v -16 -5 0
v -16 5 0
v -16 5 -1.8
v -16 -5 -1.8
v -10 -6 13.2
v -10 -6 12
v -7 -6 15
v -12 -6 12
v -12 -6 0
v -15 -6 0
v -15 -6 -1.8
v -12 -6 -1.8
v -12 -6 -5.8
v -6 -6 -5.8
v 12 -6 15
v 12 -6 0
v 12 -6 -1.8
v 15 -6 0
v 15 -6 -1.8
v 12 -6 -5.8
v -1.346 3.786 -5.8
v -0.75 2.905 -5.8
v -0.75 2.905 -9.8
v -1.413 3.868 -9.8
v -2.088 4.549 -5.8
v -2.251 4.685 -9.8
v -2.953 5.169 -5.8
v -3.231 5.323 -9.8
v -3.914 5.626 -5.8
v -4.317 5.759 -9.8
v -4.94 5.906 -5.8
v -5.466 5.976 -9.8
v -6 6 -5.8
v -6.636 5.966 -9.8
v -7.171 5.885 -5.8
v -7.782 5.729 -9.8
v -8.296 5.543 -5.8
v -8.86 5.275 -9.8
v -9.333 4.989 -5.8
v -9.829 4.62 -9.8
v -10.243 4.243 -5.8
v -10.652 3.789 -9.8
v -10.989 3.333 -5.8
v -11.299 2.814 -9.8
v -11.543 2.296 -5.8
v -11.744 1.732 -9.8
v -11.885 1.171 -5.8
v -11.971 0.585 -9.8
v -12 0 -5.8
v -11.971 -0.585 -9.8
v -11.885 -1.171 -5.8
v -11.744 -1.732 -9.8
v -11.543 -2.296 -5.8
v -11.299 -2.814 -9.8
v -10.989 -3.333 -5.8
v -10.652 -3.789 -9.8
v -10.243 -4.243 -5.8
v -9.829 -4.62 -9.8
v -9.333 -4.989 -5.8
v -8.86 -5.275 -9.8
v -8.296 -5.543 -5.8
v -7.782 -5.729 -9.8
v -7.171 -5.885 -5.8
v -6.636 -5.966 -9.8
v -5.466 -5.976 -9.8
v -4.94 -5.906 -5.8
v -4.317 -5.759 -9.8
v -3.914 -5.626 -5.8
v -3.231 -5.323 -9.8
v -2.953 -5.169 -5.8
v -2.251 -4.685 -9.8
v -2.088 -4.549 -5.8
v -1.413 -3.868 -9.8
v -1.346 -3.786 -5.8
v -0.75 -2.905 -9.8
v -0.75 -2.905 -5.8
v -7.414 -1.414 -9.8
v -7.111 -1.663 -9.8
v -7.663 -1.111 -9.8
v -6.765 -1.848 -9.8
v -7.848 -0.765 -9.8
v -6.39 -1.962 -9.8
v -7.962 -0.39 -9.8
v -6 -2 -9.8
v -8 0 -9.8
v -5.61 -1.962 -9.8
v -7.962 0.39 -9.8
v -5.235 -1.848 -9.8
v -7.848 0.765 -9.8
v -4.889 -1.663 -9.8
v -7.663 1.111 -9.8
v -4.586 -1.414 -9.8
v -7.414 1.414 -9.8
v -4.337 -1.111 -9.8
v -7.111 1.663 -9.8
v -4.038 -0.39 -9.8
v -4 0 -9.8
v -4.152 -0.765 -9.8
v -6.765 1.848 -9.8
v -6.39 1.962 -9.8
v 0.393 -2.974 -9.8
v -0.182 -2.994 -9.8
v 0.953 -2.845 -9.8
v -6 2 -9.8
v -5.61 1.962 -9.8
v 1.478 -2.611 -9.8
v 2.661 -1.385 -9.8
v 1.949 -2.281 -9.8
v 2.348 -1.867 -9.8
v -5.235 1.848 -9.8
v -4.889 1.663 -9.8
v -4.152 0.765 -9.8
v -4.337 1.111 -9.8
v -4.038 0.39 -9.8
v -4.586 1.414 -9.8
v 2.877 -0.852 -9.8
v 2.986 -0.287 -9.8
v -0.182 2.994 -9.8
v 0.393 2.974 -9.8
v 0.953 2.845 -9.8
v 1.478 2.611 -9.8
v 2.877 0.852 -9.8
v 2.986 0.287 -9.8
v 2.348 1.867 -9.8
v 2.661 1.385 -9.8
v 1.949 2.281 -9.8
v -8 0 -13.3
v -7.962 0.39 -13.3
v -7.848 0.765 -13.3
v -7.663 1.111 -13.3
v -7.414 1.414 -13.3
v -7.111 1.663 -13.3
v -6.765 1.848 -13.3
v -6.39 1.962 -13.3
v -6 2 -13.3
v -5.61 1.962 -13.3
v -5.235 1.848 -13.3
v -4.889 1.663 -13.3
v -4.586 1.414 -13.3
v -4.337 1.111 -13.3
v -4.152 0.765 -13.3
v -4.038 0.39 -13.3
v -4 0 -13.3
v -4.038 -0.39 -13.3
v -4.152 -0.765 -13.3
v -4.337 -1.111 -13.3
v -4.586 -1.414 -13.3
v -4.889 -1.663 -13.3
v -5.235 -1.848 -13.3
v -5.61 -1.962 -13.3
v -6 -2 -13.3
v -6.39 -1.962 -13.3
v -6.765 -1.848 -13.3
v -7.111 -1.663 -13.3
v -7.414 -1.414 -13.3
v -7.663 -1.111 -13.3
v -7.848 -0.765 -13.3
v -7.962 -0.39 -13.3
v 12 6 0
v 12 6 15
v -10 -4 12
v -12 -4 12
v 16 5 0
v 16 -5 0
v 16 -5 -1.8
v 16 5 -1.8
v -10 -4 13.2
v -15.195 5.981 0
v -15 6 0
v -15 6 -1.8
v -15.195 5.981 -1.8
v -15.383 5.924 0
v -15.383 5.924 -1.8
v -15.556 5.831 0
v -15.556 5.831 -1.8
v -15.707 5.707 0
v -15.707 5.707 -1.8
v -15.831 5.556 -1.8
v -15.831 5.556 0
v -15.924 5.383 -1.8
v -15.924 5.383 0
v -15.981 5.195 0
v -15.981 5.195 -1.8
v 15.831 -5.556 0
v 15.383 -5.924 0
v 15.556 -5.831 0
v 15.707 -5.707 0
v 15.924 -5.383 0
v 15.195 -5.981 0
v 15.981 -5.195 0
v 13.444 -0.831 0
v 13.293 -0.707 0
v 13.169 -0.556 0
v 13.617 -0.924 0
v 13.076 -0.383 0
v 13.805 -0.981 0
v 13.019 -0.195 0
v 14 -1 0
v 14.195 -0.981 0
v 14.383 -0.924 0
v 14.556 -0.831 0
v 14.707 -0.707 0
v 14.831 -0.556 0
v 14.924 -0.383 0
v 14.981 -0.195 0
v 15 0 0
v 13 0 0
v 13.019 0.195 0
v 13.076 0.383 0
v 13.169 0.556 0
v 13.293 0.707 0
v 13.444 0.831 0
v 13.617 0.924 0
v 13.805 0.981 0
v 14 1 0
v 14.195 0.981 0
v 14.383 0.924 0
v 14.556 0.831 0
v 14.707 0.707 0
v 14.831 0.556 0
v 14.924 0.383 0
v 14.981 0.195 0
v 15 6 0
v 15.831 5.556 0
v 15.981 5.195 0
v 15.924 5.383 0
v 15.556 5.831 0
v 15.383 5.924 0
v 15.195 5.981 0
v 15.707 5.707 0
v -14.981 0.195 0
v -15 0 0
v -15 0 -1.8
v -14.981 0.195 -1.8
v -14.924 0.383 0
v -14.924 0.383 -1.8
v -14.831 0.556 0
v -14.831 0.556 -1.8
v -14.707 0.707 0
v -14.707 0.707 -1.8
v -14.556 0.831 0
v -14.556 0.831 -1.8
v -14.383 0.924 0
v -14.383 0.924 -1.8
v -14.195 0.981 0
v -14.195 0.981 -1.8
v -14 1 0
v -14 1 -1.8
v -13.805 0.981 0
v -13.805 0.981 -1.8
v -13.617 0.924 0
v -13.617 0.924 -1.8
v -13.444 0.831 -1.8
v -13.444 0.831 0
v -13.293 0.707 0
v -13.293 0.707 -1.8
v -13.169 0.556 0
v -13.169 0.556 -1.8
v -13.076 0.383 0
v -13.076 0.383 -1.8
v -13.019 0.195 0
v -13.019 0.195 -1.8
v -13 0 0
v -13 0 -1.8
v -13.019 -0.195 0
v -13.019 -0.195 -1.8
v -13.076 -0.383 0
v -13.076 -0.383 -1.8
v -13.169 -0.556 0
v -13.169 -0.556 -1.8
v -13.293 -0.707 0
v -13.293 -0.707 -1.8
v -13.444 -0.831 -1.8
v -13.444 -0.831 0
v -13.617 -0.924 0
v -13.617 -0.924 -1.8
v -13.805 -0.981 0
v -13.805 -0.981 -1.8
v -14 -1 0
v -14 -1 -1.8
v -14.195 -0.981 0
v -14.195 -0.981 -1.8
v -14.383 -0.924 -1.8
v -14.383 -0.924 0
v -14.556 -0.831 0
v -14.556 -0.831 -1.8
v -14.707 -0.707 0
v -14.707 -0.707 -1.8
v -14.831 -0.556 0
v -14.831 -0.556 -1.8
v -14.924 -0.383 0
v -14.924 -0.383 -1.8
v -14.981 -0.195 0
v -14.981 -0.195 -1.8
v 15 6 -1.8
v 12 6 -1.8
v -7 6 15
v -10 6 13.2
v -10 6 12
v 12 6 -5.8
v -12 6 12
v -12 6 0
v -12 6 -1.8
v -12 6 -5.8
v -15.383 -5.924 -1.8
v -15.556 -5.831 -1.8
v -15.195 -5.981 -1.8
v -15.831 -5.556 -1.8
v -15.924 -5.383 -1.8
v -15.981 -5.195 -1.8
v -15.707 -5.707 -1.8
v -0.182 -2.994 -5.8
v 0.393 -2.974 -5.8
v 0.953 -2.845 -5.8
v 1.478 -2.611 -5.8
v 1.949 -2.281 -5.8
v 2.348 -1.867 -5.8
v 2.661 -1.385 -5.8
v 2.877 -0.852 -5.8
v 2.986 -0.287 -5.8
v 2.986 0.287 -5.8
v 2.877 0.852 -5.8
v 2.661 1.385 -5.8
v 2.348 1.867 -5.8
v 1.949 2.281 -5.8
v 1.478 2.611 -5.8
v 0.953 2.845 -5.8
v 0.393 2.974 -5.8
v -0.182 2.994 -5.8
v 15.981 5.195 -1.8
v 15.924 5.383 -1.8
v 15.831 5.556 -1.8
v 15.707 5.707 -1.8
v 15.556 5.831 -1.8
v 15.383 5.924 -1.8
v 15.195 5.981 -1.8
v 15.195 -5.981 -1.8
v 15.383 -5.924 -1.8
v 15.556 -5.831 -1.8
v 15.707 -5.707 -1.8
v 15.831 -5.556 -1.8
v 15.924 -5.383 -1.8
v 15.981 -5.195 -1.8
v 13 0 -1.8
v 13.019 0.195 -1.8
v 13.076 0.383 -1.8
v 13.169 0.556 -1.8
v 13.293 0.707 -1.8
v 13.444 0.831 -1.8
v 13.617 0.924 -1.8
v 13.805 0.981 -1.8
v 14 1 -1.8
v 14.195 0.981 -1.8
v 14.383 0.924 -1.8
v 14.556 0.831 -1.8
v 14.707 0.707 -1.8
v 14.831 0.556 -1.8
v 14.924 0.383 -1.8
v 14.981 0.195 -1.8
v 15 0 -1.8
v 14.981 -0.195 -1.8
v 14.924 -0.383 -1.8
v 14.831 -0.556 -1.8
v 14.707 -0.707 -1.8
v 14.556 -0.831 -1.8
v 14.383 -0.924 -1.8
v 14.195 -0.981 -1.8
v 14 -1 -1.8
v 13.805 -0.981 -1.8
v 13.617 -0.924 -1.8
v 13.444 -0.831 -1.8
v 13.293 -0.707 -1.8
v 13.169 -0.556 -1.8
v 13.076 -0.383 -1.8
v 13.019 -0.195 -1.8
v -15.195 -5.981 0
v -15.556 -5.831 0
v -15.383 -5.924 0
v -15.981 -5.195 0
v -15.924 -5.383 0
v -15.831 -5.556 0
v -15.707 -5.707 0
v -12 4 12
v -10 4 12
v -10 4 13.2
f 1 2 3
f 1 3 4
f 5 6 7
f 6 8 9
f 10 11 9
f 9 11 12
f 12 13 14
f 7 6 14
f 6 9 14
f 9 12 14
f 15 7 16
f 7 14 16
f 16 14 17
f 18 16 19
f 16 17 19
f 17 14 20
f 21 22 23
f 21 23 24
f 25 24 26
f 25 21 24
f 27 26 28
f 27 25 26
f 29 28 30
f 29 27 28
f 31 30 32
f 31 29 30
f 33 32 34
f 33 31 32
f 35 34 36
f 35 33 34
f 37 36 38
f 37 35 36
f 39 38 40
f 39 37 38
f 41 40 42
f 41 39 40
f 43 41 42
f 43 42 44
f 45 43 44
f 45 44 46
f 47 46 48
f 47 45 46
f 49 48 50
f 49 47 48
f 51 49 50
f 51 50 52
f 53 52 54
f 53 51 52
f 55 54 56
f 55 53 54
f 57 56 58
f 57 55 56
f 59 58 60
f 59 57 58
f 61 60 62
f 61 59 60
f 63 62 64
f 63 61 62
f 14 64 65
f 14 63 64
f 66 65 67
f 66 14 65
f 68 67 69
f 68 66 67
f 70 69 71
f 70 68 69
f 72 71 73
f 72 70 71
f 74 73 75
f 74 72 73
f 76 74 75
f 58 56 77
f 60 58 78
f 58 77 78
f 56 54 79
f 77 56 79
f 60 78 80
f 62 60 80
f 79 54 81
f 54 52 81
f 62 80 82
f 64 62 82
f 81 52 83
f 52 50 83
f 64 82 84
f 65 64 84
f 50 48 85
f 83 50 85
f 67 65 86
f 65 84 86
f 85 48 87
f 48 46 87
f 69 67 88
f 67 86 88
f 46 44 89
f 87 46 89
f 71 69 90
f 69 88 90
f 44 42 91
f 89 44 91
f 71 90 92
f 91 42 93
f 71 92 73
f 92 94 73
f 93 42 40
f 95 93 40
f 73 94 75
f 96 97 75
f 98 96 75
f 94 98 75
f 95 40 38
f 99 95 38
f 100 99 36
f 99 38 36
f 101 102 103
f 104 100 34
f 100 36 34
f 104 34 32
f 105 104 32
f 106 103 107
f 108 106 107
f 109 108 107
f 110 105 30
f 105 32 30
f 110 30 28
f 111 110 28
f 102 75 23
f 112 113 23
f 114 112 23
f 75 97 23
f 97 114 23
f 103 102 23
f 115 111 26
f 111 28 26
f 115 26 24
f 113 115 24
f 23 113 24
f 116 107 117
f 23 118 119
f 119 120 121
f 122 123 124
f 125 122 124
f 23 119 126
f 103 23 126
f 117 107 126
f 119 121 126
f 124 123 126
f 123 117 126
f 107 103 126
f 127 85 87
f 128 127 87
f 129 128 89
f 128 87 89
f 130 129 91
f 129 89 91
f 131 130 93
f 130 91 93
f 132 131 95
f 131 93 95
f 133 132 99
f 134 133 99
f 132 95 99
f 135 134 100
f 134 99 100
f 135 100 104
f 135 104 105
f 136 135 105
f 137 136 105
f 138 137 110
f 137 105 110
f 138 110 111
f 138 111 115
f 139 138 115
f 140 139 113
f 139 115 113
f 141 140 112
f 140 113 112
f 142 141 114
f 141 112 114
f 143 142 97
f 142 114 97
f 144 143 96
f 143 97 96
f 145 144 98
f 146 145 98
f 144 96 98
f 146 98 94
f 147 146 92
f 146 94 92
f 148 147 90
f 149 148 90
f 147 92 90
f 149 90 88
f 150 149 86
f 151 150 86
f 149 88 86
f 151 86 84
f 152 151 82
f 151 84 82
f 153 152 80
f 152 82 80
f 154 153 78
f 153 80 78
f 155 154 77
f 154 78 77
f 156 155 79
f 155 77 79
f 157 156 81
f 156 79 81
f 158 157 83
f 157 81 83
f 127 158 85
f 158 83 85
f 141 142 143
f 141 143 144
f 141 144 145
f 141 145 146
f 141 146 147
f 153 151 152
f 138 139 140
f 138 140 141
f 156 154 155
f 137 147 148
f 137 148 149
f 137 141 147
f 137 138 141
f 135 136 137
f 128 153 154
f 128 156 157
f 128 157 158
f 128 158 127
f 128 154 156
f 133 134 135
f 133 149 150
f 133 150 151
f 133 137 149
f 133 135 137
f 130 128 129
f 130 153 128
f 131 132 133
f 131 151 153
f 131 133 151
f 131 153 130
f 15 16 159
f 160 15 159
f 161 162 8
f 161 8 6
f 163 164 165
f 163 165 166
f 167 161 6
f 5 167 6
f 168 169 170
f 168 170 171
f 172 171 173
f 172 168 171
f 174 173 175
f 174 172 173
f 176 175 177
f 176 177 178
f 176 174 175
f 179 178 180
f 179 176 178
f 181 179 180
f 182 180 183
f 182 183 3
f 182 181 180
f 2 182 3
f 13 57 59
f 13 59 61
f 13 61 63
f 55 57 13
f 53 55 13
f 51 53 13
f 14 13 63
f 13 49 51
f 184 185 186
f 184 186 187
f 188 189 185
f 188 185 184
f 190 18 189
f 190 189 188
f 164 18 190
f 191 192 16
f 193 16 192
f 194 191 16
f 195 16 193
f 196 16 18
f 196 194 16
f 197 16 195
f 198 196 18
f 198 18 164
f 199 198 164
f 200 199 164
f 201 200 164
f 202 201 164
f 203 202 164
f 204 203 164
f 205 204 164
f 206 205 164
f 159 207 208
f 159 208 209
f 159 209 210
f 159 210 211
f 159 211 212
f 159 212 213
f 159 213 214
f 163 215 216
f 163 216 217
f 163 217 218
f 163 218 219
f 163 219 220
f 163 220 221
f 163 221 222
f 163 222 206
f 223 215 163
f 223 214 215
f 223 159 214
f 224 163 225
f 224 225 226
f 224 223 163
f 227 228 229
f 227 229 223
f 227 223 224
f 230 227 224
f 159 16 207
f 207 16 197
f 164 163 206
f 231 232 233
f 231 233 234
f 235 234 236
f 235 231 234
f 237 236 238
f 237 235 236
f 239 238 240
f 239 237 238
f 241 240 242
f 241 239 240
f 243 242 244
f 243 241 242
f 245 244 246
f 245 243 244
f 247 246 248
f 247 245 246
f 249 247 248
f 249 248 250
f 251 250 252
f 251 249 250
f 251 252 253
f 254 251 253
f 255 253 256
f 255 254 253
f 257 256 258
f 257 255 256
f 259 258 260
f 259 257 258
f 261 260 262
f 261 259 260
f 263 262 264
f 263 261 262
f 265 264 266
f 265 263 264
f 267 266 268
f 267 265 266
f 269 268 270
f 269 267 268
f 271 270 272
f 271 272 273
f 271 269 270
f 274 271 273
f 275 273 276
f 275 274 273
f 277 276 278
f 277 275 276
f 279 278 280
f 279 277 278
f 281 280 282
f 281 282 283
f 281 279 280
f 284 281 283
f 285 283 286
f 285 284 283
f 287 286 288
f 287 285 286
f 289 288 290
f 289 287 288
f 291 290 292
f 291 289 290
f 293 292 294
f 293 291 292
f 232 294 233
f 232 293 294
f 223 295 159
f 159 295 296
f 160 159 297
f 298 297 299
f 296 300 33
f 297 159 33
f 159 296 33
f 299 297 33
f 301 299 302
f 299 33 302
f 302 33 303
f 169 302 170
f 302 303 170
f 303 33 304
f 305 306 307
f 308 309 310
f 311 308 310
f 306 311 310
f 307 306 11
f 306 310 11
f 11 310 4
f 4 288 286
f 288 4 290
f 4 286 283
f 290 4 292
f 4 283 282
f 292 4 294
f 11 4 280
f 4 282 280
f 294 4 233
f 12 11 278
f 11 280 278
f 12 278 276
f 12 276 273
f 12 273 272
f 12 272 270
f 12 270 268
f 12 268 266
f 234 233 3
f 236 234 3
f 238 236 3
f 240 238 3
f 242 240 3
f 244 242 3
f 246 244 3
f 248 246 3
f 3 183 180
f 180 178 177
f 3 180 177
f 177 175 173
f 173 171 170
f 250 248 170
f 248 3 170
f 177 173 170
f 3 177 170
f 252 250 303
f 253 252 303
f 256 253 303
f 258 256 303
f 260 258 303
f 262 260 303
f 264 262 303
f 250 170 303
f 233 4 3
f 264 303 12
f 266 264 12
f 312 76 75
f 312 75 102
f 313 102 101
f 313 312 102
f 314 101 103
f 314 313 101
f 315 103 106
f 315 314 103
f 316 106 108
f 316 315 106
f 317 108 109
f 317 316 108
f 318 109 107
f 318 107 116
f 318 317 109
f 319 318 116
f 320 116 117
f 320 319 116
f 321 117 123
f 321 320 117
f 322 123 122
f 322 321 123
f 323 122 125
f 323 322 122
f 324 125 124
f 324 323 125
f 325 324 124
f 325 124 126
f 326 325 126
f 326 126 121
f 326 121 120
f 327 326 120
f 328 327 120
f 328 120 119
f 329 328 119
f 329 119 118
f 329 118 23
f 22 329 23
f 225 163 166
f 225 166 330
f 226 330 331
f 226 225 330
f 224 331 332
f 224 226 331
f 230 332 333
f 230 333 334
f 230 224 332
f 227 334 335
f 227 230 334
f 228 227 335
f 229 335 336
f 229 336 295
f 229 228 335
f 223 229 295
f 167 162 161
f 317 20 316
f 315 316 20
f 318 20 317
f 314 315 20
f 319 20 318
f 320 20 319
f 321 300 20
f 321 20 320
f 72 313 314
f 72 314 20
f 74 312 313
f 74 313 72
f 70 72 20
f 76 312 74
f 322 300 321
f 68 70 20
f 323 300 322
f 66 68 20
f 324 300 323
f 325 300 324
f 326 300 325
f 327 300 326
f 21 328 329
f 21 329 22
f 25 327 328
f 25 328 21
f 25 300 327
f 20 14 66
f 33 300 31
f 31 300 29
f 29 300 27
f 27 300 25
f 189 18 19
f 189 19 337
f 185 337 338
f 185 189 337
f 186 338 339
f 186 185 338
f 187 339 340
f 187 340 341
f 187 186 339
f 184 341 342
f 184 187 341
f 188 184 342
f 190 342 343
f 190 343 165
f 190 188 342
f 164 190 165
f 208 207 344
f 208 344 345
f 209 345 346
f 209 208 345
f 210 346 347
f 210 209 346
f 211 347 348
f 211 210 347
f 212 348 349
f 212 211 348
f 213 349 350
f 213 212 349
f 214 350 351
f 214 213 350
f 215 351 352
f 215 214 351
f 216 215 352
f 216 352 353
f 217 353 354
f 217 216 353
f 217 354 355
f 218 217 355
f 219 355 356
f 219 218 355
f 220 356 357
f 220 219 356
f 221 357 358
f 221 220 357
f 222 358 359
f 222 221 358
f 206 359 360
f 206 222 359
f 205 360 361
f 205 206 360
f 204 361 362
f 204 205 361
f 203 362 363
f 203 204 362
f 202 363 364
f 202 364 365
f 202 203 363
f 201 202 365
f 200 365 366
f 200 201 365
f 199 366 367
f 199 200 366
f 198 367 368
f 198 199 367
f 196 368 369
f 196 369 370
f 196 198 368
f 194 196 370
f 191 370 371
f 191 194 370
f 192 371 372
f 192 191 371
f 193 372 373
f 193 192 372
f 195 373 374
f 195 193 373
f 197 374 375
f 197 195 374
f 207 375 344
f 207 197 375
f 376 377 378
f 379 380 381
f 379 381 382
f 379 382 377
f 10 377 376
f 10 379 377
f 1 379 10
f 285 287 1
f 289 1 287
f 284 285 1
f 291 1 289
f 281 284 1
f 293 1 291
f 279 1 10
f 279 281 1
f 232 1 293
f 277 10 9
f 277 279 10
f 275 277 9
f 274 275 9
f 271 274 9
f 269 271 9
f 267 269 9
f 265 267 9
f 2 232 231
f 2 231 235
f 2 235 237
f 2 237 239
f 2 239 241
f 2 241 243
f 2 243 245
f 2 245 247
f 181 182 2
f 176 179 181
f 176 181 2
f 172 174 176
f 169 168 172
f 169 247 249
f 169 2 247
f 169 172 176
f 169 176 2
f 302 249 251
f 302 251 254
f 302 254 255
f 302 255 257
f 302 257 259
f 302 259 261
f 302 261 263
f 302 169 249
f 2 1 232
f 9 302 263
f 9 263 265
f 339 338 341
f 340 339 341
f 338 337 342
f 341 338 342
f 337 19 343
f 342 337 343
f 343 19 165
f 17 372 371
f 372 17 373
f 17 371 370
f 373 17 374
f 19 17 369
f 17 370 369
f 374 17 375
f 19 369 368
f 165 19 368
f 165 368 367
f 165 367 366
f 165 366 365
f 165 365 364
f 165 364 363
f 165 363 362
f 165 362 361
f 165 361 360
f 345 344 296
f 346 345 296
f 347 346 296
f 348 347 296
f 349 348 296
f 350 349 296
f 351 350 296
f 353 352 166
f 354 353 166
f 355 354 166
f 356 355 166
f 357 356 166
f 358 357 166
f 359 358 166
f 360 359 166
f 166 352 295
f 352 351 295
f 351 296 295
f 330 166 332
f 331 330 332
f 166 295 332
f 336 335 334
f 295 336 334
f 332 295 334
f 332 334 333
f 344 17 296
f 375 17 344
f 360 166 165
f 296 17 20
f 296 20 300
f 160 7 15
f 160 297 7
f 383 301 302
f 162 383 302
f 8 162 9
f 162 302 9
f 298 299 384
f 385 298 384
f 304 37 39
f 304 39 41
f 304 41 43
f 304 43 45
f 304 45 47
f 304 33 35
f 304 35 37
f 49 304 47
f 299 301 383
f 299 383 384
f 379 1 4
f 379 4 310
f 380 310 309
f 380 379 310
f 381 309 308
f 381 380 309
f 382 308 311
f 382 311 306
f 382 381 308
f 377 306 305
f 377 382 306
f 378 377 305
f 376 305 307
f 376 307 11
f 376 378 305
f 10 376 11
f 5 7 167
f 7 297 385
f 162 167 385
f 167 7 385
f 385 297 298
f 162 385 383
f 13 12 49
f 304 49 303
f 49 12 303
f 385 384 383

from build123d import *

# Parameters (mm, degrees)
SKETCH_1_W          = 24
SKETCH_1_H          = 12
EXTRUDE_1_DEPTH     = 12
SKETCH_2_R          = 1
EXTRUDE_2_DEPTH     = 1.8
SKETCH_3_W          = 24
SKETCH_3_H          = 12
EXTRUDE_3_DEPTH     = 4
EXTRUDE_4_DEPTH     = 4
SKETCH_5_R          = 2
EXTRUDE_5_DEPTH     = 3.5
EXTRUDE_6_DEPTH     = 3
CUT_EXTRUDE_1_DEPTH = 12


with BuildPart() as part:
    # Эскиз1 → Бобышка-Вытянуть1 (new body)
    with BuildSketch(Plane.XY):
        Rectangle(SKETCH_1_W, SKETCH_1_H)
    extrude(amount=EXTRUDE_1_DEPTH)

    # Эскиз2 → Бобышка-Вытянуть2 (add)
    with BuildSketch(Plane(origin=(0, 0, 0), x_dir=(-1, 0, 0), z_dir=(0, 0, -1))):
        with BuildLine():
            Line((12, 6), (15, 6))
            ThreePointArc((15, 6), (15.707106781, 5.707106781), (16, 5))
            Line((16, 5), (16, -5))
            ThreePointArc((16, -5), (15.707106781, -5.707106781), (15, -6))
            Line((15, -6), (12, -6))
            Line((12, -6), (-12, -6))
            Line((-12, -6), (-15, -6))
            ThreePointArc((-15, -6), (-15.707106781, -5.707106781), (-16, -5))
            Line((-16, -5), (-16, 5))
            ThreePointArc((-16, 5), (-15.707106781, 5.707106781), (-15, 6))
            Line((-15, 6), (-12, 6))
            Line((-12, 6), (12, 6))
        make_face()
        with Locations((14, 0)):
            Circle(SKETCH_2_R, mode=Mode.SUBTRACT)
        with Locations((-14, 0)):
            Circle(SKETCH_2_R, mode=Mode.SUBTRACT)
    extrude(amount=EXTRUDE_2_DEPTH)

    # Эскиз3 → Бобышка-Вытянуть3 (add)
    with BuildSketch(Plane(origin=(0, 0, -1.8), x_dir=(-1, 0, 0), z_dir=(0, 0, -1))):
        Rectangle(SKETCH_3_W, SKETCH_3_H)
    extrude(amount=EXTRUDE_3_DEPTH)

    # Эскиз4 → Бобышка-Вытянуть4 (add)
    with BuildSketch(Plane(origin=(0, 0, -5.8), x_dir=(-1, 0, 0), z_dir=(0, 0, -1))):
        with BuildLine():
            ThreePointArc((0.75, 2.90473751), (12, 0), (0.75, -2.90473751))
            ThreePointArc((0.75, -2.90473751), (-3, 0), (0.75, 2.90473751))
        make_face()
    extrude(amount=EXTRUDE_4_DEPTH)

    # Эскиз5 → Бобышка-Вытянуть5 (add)
    with BuildSketch(Plane(origin=(0, 0, -9.8), x_dir=(-1, 0, 0), z_dir=(0, 0, -1))):
        with Locations((6, 0)):
            Circle(SKETCH_5_R)
    extrude(amount=EXTRUDE_5_DEPTH)

    # Эскиз6 → Бобышка-Вытянуть6 (add)
    with BuildSketch(Plane.XY.offset(12)):
        Polygon((12, -6), (12, 6), (-10, 6), (-10, 4), (-12, 4), (-12, -4), (-10, -4), (-10, -6), align=None)
    extrude(amount=EXTRUDE_6_DEPTH)

    # Эскиз8 → Вырез-Вытянуть1 (cut)
    with BuildSketch(Plane(origin=(0, 6, 0), x_dir=(1, 0, 0), z_dir=(0, 1, 0))):
        Polygon((-7, -15), (-12, -12), (-12, -15), align=None)
    extrude(amount=-CUT_EXTRUDE_1_DEPTH, mode=Mode.SUBTRACT)


solid = part.part
